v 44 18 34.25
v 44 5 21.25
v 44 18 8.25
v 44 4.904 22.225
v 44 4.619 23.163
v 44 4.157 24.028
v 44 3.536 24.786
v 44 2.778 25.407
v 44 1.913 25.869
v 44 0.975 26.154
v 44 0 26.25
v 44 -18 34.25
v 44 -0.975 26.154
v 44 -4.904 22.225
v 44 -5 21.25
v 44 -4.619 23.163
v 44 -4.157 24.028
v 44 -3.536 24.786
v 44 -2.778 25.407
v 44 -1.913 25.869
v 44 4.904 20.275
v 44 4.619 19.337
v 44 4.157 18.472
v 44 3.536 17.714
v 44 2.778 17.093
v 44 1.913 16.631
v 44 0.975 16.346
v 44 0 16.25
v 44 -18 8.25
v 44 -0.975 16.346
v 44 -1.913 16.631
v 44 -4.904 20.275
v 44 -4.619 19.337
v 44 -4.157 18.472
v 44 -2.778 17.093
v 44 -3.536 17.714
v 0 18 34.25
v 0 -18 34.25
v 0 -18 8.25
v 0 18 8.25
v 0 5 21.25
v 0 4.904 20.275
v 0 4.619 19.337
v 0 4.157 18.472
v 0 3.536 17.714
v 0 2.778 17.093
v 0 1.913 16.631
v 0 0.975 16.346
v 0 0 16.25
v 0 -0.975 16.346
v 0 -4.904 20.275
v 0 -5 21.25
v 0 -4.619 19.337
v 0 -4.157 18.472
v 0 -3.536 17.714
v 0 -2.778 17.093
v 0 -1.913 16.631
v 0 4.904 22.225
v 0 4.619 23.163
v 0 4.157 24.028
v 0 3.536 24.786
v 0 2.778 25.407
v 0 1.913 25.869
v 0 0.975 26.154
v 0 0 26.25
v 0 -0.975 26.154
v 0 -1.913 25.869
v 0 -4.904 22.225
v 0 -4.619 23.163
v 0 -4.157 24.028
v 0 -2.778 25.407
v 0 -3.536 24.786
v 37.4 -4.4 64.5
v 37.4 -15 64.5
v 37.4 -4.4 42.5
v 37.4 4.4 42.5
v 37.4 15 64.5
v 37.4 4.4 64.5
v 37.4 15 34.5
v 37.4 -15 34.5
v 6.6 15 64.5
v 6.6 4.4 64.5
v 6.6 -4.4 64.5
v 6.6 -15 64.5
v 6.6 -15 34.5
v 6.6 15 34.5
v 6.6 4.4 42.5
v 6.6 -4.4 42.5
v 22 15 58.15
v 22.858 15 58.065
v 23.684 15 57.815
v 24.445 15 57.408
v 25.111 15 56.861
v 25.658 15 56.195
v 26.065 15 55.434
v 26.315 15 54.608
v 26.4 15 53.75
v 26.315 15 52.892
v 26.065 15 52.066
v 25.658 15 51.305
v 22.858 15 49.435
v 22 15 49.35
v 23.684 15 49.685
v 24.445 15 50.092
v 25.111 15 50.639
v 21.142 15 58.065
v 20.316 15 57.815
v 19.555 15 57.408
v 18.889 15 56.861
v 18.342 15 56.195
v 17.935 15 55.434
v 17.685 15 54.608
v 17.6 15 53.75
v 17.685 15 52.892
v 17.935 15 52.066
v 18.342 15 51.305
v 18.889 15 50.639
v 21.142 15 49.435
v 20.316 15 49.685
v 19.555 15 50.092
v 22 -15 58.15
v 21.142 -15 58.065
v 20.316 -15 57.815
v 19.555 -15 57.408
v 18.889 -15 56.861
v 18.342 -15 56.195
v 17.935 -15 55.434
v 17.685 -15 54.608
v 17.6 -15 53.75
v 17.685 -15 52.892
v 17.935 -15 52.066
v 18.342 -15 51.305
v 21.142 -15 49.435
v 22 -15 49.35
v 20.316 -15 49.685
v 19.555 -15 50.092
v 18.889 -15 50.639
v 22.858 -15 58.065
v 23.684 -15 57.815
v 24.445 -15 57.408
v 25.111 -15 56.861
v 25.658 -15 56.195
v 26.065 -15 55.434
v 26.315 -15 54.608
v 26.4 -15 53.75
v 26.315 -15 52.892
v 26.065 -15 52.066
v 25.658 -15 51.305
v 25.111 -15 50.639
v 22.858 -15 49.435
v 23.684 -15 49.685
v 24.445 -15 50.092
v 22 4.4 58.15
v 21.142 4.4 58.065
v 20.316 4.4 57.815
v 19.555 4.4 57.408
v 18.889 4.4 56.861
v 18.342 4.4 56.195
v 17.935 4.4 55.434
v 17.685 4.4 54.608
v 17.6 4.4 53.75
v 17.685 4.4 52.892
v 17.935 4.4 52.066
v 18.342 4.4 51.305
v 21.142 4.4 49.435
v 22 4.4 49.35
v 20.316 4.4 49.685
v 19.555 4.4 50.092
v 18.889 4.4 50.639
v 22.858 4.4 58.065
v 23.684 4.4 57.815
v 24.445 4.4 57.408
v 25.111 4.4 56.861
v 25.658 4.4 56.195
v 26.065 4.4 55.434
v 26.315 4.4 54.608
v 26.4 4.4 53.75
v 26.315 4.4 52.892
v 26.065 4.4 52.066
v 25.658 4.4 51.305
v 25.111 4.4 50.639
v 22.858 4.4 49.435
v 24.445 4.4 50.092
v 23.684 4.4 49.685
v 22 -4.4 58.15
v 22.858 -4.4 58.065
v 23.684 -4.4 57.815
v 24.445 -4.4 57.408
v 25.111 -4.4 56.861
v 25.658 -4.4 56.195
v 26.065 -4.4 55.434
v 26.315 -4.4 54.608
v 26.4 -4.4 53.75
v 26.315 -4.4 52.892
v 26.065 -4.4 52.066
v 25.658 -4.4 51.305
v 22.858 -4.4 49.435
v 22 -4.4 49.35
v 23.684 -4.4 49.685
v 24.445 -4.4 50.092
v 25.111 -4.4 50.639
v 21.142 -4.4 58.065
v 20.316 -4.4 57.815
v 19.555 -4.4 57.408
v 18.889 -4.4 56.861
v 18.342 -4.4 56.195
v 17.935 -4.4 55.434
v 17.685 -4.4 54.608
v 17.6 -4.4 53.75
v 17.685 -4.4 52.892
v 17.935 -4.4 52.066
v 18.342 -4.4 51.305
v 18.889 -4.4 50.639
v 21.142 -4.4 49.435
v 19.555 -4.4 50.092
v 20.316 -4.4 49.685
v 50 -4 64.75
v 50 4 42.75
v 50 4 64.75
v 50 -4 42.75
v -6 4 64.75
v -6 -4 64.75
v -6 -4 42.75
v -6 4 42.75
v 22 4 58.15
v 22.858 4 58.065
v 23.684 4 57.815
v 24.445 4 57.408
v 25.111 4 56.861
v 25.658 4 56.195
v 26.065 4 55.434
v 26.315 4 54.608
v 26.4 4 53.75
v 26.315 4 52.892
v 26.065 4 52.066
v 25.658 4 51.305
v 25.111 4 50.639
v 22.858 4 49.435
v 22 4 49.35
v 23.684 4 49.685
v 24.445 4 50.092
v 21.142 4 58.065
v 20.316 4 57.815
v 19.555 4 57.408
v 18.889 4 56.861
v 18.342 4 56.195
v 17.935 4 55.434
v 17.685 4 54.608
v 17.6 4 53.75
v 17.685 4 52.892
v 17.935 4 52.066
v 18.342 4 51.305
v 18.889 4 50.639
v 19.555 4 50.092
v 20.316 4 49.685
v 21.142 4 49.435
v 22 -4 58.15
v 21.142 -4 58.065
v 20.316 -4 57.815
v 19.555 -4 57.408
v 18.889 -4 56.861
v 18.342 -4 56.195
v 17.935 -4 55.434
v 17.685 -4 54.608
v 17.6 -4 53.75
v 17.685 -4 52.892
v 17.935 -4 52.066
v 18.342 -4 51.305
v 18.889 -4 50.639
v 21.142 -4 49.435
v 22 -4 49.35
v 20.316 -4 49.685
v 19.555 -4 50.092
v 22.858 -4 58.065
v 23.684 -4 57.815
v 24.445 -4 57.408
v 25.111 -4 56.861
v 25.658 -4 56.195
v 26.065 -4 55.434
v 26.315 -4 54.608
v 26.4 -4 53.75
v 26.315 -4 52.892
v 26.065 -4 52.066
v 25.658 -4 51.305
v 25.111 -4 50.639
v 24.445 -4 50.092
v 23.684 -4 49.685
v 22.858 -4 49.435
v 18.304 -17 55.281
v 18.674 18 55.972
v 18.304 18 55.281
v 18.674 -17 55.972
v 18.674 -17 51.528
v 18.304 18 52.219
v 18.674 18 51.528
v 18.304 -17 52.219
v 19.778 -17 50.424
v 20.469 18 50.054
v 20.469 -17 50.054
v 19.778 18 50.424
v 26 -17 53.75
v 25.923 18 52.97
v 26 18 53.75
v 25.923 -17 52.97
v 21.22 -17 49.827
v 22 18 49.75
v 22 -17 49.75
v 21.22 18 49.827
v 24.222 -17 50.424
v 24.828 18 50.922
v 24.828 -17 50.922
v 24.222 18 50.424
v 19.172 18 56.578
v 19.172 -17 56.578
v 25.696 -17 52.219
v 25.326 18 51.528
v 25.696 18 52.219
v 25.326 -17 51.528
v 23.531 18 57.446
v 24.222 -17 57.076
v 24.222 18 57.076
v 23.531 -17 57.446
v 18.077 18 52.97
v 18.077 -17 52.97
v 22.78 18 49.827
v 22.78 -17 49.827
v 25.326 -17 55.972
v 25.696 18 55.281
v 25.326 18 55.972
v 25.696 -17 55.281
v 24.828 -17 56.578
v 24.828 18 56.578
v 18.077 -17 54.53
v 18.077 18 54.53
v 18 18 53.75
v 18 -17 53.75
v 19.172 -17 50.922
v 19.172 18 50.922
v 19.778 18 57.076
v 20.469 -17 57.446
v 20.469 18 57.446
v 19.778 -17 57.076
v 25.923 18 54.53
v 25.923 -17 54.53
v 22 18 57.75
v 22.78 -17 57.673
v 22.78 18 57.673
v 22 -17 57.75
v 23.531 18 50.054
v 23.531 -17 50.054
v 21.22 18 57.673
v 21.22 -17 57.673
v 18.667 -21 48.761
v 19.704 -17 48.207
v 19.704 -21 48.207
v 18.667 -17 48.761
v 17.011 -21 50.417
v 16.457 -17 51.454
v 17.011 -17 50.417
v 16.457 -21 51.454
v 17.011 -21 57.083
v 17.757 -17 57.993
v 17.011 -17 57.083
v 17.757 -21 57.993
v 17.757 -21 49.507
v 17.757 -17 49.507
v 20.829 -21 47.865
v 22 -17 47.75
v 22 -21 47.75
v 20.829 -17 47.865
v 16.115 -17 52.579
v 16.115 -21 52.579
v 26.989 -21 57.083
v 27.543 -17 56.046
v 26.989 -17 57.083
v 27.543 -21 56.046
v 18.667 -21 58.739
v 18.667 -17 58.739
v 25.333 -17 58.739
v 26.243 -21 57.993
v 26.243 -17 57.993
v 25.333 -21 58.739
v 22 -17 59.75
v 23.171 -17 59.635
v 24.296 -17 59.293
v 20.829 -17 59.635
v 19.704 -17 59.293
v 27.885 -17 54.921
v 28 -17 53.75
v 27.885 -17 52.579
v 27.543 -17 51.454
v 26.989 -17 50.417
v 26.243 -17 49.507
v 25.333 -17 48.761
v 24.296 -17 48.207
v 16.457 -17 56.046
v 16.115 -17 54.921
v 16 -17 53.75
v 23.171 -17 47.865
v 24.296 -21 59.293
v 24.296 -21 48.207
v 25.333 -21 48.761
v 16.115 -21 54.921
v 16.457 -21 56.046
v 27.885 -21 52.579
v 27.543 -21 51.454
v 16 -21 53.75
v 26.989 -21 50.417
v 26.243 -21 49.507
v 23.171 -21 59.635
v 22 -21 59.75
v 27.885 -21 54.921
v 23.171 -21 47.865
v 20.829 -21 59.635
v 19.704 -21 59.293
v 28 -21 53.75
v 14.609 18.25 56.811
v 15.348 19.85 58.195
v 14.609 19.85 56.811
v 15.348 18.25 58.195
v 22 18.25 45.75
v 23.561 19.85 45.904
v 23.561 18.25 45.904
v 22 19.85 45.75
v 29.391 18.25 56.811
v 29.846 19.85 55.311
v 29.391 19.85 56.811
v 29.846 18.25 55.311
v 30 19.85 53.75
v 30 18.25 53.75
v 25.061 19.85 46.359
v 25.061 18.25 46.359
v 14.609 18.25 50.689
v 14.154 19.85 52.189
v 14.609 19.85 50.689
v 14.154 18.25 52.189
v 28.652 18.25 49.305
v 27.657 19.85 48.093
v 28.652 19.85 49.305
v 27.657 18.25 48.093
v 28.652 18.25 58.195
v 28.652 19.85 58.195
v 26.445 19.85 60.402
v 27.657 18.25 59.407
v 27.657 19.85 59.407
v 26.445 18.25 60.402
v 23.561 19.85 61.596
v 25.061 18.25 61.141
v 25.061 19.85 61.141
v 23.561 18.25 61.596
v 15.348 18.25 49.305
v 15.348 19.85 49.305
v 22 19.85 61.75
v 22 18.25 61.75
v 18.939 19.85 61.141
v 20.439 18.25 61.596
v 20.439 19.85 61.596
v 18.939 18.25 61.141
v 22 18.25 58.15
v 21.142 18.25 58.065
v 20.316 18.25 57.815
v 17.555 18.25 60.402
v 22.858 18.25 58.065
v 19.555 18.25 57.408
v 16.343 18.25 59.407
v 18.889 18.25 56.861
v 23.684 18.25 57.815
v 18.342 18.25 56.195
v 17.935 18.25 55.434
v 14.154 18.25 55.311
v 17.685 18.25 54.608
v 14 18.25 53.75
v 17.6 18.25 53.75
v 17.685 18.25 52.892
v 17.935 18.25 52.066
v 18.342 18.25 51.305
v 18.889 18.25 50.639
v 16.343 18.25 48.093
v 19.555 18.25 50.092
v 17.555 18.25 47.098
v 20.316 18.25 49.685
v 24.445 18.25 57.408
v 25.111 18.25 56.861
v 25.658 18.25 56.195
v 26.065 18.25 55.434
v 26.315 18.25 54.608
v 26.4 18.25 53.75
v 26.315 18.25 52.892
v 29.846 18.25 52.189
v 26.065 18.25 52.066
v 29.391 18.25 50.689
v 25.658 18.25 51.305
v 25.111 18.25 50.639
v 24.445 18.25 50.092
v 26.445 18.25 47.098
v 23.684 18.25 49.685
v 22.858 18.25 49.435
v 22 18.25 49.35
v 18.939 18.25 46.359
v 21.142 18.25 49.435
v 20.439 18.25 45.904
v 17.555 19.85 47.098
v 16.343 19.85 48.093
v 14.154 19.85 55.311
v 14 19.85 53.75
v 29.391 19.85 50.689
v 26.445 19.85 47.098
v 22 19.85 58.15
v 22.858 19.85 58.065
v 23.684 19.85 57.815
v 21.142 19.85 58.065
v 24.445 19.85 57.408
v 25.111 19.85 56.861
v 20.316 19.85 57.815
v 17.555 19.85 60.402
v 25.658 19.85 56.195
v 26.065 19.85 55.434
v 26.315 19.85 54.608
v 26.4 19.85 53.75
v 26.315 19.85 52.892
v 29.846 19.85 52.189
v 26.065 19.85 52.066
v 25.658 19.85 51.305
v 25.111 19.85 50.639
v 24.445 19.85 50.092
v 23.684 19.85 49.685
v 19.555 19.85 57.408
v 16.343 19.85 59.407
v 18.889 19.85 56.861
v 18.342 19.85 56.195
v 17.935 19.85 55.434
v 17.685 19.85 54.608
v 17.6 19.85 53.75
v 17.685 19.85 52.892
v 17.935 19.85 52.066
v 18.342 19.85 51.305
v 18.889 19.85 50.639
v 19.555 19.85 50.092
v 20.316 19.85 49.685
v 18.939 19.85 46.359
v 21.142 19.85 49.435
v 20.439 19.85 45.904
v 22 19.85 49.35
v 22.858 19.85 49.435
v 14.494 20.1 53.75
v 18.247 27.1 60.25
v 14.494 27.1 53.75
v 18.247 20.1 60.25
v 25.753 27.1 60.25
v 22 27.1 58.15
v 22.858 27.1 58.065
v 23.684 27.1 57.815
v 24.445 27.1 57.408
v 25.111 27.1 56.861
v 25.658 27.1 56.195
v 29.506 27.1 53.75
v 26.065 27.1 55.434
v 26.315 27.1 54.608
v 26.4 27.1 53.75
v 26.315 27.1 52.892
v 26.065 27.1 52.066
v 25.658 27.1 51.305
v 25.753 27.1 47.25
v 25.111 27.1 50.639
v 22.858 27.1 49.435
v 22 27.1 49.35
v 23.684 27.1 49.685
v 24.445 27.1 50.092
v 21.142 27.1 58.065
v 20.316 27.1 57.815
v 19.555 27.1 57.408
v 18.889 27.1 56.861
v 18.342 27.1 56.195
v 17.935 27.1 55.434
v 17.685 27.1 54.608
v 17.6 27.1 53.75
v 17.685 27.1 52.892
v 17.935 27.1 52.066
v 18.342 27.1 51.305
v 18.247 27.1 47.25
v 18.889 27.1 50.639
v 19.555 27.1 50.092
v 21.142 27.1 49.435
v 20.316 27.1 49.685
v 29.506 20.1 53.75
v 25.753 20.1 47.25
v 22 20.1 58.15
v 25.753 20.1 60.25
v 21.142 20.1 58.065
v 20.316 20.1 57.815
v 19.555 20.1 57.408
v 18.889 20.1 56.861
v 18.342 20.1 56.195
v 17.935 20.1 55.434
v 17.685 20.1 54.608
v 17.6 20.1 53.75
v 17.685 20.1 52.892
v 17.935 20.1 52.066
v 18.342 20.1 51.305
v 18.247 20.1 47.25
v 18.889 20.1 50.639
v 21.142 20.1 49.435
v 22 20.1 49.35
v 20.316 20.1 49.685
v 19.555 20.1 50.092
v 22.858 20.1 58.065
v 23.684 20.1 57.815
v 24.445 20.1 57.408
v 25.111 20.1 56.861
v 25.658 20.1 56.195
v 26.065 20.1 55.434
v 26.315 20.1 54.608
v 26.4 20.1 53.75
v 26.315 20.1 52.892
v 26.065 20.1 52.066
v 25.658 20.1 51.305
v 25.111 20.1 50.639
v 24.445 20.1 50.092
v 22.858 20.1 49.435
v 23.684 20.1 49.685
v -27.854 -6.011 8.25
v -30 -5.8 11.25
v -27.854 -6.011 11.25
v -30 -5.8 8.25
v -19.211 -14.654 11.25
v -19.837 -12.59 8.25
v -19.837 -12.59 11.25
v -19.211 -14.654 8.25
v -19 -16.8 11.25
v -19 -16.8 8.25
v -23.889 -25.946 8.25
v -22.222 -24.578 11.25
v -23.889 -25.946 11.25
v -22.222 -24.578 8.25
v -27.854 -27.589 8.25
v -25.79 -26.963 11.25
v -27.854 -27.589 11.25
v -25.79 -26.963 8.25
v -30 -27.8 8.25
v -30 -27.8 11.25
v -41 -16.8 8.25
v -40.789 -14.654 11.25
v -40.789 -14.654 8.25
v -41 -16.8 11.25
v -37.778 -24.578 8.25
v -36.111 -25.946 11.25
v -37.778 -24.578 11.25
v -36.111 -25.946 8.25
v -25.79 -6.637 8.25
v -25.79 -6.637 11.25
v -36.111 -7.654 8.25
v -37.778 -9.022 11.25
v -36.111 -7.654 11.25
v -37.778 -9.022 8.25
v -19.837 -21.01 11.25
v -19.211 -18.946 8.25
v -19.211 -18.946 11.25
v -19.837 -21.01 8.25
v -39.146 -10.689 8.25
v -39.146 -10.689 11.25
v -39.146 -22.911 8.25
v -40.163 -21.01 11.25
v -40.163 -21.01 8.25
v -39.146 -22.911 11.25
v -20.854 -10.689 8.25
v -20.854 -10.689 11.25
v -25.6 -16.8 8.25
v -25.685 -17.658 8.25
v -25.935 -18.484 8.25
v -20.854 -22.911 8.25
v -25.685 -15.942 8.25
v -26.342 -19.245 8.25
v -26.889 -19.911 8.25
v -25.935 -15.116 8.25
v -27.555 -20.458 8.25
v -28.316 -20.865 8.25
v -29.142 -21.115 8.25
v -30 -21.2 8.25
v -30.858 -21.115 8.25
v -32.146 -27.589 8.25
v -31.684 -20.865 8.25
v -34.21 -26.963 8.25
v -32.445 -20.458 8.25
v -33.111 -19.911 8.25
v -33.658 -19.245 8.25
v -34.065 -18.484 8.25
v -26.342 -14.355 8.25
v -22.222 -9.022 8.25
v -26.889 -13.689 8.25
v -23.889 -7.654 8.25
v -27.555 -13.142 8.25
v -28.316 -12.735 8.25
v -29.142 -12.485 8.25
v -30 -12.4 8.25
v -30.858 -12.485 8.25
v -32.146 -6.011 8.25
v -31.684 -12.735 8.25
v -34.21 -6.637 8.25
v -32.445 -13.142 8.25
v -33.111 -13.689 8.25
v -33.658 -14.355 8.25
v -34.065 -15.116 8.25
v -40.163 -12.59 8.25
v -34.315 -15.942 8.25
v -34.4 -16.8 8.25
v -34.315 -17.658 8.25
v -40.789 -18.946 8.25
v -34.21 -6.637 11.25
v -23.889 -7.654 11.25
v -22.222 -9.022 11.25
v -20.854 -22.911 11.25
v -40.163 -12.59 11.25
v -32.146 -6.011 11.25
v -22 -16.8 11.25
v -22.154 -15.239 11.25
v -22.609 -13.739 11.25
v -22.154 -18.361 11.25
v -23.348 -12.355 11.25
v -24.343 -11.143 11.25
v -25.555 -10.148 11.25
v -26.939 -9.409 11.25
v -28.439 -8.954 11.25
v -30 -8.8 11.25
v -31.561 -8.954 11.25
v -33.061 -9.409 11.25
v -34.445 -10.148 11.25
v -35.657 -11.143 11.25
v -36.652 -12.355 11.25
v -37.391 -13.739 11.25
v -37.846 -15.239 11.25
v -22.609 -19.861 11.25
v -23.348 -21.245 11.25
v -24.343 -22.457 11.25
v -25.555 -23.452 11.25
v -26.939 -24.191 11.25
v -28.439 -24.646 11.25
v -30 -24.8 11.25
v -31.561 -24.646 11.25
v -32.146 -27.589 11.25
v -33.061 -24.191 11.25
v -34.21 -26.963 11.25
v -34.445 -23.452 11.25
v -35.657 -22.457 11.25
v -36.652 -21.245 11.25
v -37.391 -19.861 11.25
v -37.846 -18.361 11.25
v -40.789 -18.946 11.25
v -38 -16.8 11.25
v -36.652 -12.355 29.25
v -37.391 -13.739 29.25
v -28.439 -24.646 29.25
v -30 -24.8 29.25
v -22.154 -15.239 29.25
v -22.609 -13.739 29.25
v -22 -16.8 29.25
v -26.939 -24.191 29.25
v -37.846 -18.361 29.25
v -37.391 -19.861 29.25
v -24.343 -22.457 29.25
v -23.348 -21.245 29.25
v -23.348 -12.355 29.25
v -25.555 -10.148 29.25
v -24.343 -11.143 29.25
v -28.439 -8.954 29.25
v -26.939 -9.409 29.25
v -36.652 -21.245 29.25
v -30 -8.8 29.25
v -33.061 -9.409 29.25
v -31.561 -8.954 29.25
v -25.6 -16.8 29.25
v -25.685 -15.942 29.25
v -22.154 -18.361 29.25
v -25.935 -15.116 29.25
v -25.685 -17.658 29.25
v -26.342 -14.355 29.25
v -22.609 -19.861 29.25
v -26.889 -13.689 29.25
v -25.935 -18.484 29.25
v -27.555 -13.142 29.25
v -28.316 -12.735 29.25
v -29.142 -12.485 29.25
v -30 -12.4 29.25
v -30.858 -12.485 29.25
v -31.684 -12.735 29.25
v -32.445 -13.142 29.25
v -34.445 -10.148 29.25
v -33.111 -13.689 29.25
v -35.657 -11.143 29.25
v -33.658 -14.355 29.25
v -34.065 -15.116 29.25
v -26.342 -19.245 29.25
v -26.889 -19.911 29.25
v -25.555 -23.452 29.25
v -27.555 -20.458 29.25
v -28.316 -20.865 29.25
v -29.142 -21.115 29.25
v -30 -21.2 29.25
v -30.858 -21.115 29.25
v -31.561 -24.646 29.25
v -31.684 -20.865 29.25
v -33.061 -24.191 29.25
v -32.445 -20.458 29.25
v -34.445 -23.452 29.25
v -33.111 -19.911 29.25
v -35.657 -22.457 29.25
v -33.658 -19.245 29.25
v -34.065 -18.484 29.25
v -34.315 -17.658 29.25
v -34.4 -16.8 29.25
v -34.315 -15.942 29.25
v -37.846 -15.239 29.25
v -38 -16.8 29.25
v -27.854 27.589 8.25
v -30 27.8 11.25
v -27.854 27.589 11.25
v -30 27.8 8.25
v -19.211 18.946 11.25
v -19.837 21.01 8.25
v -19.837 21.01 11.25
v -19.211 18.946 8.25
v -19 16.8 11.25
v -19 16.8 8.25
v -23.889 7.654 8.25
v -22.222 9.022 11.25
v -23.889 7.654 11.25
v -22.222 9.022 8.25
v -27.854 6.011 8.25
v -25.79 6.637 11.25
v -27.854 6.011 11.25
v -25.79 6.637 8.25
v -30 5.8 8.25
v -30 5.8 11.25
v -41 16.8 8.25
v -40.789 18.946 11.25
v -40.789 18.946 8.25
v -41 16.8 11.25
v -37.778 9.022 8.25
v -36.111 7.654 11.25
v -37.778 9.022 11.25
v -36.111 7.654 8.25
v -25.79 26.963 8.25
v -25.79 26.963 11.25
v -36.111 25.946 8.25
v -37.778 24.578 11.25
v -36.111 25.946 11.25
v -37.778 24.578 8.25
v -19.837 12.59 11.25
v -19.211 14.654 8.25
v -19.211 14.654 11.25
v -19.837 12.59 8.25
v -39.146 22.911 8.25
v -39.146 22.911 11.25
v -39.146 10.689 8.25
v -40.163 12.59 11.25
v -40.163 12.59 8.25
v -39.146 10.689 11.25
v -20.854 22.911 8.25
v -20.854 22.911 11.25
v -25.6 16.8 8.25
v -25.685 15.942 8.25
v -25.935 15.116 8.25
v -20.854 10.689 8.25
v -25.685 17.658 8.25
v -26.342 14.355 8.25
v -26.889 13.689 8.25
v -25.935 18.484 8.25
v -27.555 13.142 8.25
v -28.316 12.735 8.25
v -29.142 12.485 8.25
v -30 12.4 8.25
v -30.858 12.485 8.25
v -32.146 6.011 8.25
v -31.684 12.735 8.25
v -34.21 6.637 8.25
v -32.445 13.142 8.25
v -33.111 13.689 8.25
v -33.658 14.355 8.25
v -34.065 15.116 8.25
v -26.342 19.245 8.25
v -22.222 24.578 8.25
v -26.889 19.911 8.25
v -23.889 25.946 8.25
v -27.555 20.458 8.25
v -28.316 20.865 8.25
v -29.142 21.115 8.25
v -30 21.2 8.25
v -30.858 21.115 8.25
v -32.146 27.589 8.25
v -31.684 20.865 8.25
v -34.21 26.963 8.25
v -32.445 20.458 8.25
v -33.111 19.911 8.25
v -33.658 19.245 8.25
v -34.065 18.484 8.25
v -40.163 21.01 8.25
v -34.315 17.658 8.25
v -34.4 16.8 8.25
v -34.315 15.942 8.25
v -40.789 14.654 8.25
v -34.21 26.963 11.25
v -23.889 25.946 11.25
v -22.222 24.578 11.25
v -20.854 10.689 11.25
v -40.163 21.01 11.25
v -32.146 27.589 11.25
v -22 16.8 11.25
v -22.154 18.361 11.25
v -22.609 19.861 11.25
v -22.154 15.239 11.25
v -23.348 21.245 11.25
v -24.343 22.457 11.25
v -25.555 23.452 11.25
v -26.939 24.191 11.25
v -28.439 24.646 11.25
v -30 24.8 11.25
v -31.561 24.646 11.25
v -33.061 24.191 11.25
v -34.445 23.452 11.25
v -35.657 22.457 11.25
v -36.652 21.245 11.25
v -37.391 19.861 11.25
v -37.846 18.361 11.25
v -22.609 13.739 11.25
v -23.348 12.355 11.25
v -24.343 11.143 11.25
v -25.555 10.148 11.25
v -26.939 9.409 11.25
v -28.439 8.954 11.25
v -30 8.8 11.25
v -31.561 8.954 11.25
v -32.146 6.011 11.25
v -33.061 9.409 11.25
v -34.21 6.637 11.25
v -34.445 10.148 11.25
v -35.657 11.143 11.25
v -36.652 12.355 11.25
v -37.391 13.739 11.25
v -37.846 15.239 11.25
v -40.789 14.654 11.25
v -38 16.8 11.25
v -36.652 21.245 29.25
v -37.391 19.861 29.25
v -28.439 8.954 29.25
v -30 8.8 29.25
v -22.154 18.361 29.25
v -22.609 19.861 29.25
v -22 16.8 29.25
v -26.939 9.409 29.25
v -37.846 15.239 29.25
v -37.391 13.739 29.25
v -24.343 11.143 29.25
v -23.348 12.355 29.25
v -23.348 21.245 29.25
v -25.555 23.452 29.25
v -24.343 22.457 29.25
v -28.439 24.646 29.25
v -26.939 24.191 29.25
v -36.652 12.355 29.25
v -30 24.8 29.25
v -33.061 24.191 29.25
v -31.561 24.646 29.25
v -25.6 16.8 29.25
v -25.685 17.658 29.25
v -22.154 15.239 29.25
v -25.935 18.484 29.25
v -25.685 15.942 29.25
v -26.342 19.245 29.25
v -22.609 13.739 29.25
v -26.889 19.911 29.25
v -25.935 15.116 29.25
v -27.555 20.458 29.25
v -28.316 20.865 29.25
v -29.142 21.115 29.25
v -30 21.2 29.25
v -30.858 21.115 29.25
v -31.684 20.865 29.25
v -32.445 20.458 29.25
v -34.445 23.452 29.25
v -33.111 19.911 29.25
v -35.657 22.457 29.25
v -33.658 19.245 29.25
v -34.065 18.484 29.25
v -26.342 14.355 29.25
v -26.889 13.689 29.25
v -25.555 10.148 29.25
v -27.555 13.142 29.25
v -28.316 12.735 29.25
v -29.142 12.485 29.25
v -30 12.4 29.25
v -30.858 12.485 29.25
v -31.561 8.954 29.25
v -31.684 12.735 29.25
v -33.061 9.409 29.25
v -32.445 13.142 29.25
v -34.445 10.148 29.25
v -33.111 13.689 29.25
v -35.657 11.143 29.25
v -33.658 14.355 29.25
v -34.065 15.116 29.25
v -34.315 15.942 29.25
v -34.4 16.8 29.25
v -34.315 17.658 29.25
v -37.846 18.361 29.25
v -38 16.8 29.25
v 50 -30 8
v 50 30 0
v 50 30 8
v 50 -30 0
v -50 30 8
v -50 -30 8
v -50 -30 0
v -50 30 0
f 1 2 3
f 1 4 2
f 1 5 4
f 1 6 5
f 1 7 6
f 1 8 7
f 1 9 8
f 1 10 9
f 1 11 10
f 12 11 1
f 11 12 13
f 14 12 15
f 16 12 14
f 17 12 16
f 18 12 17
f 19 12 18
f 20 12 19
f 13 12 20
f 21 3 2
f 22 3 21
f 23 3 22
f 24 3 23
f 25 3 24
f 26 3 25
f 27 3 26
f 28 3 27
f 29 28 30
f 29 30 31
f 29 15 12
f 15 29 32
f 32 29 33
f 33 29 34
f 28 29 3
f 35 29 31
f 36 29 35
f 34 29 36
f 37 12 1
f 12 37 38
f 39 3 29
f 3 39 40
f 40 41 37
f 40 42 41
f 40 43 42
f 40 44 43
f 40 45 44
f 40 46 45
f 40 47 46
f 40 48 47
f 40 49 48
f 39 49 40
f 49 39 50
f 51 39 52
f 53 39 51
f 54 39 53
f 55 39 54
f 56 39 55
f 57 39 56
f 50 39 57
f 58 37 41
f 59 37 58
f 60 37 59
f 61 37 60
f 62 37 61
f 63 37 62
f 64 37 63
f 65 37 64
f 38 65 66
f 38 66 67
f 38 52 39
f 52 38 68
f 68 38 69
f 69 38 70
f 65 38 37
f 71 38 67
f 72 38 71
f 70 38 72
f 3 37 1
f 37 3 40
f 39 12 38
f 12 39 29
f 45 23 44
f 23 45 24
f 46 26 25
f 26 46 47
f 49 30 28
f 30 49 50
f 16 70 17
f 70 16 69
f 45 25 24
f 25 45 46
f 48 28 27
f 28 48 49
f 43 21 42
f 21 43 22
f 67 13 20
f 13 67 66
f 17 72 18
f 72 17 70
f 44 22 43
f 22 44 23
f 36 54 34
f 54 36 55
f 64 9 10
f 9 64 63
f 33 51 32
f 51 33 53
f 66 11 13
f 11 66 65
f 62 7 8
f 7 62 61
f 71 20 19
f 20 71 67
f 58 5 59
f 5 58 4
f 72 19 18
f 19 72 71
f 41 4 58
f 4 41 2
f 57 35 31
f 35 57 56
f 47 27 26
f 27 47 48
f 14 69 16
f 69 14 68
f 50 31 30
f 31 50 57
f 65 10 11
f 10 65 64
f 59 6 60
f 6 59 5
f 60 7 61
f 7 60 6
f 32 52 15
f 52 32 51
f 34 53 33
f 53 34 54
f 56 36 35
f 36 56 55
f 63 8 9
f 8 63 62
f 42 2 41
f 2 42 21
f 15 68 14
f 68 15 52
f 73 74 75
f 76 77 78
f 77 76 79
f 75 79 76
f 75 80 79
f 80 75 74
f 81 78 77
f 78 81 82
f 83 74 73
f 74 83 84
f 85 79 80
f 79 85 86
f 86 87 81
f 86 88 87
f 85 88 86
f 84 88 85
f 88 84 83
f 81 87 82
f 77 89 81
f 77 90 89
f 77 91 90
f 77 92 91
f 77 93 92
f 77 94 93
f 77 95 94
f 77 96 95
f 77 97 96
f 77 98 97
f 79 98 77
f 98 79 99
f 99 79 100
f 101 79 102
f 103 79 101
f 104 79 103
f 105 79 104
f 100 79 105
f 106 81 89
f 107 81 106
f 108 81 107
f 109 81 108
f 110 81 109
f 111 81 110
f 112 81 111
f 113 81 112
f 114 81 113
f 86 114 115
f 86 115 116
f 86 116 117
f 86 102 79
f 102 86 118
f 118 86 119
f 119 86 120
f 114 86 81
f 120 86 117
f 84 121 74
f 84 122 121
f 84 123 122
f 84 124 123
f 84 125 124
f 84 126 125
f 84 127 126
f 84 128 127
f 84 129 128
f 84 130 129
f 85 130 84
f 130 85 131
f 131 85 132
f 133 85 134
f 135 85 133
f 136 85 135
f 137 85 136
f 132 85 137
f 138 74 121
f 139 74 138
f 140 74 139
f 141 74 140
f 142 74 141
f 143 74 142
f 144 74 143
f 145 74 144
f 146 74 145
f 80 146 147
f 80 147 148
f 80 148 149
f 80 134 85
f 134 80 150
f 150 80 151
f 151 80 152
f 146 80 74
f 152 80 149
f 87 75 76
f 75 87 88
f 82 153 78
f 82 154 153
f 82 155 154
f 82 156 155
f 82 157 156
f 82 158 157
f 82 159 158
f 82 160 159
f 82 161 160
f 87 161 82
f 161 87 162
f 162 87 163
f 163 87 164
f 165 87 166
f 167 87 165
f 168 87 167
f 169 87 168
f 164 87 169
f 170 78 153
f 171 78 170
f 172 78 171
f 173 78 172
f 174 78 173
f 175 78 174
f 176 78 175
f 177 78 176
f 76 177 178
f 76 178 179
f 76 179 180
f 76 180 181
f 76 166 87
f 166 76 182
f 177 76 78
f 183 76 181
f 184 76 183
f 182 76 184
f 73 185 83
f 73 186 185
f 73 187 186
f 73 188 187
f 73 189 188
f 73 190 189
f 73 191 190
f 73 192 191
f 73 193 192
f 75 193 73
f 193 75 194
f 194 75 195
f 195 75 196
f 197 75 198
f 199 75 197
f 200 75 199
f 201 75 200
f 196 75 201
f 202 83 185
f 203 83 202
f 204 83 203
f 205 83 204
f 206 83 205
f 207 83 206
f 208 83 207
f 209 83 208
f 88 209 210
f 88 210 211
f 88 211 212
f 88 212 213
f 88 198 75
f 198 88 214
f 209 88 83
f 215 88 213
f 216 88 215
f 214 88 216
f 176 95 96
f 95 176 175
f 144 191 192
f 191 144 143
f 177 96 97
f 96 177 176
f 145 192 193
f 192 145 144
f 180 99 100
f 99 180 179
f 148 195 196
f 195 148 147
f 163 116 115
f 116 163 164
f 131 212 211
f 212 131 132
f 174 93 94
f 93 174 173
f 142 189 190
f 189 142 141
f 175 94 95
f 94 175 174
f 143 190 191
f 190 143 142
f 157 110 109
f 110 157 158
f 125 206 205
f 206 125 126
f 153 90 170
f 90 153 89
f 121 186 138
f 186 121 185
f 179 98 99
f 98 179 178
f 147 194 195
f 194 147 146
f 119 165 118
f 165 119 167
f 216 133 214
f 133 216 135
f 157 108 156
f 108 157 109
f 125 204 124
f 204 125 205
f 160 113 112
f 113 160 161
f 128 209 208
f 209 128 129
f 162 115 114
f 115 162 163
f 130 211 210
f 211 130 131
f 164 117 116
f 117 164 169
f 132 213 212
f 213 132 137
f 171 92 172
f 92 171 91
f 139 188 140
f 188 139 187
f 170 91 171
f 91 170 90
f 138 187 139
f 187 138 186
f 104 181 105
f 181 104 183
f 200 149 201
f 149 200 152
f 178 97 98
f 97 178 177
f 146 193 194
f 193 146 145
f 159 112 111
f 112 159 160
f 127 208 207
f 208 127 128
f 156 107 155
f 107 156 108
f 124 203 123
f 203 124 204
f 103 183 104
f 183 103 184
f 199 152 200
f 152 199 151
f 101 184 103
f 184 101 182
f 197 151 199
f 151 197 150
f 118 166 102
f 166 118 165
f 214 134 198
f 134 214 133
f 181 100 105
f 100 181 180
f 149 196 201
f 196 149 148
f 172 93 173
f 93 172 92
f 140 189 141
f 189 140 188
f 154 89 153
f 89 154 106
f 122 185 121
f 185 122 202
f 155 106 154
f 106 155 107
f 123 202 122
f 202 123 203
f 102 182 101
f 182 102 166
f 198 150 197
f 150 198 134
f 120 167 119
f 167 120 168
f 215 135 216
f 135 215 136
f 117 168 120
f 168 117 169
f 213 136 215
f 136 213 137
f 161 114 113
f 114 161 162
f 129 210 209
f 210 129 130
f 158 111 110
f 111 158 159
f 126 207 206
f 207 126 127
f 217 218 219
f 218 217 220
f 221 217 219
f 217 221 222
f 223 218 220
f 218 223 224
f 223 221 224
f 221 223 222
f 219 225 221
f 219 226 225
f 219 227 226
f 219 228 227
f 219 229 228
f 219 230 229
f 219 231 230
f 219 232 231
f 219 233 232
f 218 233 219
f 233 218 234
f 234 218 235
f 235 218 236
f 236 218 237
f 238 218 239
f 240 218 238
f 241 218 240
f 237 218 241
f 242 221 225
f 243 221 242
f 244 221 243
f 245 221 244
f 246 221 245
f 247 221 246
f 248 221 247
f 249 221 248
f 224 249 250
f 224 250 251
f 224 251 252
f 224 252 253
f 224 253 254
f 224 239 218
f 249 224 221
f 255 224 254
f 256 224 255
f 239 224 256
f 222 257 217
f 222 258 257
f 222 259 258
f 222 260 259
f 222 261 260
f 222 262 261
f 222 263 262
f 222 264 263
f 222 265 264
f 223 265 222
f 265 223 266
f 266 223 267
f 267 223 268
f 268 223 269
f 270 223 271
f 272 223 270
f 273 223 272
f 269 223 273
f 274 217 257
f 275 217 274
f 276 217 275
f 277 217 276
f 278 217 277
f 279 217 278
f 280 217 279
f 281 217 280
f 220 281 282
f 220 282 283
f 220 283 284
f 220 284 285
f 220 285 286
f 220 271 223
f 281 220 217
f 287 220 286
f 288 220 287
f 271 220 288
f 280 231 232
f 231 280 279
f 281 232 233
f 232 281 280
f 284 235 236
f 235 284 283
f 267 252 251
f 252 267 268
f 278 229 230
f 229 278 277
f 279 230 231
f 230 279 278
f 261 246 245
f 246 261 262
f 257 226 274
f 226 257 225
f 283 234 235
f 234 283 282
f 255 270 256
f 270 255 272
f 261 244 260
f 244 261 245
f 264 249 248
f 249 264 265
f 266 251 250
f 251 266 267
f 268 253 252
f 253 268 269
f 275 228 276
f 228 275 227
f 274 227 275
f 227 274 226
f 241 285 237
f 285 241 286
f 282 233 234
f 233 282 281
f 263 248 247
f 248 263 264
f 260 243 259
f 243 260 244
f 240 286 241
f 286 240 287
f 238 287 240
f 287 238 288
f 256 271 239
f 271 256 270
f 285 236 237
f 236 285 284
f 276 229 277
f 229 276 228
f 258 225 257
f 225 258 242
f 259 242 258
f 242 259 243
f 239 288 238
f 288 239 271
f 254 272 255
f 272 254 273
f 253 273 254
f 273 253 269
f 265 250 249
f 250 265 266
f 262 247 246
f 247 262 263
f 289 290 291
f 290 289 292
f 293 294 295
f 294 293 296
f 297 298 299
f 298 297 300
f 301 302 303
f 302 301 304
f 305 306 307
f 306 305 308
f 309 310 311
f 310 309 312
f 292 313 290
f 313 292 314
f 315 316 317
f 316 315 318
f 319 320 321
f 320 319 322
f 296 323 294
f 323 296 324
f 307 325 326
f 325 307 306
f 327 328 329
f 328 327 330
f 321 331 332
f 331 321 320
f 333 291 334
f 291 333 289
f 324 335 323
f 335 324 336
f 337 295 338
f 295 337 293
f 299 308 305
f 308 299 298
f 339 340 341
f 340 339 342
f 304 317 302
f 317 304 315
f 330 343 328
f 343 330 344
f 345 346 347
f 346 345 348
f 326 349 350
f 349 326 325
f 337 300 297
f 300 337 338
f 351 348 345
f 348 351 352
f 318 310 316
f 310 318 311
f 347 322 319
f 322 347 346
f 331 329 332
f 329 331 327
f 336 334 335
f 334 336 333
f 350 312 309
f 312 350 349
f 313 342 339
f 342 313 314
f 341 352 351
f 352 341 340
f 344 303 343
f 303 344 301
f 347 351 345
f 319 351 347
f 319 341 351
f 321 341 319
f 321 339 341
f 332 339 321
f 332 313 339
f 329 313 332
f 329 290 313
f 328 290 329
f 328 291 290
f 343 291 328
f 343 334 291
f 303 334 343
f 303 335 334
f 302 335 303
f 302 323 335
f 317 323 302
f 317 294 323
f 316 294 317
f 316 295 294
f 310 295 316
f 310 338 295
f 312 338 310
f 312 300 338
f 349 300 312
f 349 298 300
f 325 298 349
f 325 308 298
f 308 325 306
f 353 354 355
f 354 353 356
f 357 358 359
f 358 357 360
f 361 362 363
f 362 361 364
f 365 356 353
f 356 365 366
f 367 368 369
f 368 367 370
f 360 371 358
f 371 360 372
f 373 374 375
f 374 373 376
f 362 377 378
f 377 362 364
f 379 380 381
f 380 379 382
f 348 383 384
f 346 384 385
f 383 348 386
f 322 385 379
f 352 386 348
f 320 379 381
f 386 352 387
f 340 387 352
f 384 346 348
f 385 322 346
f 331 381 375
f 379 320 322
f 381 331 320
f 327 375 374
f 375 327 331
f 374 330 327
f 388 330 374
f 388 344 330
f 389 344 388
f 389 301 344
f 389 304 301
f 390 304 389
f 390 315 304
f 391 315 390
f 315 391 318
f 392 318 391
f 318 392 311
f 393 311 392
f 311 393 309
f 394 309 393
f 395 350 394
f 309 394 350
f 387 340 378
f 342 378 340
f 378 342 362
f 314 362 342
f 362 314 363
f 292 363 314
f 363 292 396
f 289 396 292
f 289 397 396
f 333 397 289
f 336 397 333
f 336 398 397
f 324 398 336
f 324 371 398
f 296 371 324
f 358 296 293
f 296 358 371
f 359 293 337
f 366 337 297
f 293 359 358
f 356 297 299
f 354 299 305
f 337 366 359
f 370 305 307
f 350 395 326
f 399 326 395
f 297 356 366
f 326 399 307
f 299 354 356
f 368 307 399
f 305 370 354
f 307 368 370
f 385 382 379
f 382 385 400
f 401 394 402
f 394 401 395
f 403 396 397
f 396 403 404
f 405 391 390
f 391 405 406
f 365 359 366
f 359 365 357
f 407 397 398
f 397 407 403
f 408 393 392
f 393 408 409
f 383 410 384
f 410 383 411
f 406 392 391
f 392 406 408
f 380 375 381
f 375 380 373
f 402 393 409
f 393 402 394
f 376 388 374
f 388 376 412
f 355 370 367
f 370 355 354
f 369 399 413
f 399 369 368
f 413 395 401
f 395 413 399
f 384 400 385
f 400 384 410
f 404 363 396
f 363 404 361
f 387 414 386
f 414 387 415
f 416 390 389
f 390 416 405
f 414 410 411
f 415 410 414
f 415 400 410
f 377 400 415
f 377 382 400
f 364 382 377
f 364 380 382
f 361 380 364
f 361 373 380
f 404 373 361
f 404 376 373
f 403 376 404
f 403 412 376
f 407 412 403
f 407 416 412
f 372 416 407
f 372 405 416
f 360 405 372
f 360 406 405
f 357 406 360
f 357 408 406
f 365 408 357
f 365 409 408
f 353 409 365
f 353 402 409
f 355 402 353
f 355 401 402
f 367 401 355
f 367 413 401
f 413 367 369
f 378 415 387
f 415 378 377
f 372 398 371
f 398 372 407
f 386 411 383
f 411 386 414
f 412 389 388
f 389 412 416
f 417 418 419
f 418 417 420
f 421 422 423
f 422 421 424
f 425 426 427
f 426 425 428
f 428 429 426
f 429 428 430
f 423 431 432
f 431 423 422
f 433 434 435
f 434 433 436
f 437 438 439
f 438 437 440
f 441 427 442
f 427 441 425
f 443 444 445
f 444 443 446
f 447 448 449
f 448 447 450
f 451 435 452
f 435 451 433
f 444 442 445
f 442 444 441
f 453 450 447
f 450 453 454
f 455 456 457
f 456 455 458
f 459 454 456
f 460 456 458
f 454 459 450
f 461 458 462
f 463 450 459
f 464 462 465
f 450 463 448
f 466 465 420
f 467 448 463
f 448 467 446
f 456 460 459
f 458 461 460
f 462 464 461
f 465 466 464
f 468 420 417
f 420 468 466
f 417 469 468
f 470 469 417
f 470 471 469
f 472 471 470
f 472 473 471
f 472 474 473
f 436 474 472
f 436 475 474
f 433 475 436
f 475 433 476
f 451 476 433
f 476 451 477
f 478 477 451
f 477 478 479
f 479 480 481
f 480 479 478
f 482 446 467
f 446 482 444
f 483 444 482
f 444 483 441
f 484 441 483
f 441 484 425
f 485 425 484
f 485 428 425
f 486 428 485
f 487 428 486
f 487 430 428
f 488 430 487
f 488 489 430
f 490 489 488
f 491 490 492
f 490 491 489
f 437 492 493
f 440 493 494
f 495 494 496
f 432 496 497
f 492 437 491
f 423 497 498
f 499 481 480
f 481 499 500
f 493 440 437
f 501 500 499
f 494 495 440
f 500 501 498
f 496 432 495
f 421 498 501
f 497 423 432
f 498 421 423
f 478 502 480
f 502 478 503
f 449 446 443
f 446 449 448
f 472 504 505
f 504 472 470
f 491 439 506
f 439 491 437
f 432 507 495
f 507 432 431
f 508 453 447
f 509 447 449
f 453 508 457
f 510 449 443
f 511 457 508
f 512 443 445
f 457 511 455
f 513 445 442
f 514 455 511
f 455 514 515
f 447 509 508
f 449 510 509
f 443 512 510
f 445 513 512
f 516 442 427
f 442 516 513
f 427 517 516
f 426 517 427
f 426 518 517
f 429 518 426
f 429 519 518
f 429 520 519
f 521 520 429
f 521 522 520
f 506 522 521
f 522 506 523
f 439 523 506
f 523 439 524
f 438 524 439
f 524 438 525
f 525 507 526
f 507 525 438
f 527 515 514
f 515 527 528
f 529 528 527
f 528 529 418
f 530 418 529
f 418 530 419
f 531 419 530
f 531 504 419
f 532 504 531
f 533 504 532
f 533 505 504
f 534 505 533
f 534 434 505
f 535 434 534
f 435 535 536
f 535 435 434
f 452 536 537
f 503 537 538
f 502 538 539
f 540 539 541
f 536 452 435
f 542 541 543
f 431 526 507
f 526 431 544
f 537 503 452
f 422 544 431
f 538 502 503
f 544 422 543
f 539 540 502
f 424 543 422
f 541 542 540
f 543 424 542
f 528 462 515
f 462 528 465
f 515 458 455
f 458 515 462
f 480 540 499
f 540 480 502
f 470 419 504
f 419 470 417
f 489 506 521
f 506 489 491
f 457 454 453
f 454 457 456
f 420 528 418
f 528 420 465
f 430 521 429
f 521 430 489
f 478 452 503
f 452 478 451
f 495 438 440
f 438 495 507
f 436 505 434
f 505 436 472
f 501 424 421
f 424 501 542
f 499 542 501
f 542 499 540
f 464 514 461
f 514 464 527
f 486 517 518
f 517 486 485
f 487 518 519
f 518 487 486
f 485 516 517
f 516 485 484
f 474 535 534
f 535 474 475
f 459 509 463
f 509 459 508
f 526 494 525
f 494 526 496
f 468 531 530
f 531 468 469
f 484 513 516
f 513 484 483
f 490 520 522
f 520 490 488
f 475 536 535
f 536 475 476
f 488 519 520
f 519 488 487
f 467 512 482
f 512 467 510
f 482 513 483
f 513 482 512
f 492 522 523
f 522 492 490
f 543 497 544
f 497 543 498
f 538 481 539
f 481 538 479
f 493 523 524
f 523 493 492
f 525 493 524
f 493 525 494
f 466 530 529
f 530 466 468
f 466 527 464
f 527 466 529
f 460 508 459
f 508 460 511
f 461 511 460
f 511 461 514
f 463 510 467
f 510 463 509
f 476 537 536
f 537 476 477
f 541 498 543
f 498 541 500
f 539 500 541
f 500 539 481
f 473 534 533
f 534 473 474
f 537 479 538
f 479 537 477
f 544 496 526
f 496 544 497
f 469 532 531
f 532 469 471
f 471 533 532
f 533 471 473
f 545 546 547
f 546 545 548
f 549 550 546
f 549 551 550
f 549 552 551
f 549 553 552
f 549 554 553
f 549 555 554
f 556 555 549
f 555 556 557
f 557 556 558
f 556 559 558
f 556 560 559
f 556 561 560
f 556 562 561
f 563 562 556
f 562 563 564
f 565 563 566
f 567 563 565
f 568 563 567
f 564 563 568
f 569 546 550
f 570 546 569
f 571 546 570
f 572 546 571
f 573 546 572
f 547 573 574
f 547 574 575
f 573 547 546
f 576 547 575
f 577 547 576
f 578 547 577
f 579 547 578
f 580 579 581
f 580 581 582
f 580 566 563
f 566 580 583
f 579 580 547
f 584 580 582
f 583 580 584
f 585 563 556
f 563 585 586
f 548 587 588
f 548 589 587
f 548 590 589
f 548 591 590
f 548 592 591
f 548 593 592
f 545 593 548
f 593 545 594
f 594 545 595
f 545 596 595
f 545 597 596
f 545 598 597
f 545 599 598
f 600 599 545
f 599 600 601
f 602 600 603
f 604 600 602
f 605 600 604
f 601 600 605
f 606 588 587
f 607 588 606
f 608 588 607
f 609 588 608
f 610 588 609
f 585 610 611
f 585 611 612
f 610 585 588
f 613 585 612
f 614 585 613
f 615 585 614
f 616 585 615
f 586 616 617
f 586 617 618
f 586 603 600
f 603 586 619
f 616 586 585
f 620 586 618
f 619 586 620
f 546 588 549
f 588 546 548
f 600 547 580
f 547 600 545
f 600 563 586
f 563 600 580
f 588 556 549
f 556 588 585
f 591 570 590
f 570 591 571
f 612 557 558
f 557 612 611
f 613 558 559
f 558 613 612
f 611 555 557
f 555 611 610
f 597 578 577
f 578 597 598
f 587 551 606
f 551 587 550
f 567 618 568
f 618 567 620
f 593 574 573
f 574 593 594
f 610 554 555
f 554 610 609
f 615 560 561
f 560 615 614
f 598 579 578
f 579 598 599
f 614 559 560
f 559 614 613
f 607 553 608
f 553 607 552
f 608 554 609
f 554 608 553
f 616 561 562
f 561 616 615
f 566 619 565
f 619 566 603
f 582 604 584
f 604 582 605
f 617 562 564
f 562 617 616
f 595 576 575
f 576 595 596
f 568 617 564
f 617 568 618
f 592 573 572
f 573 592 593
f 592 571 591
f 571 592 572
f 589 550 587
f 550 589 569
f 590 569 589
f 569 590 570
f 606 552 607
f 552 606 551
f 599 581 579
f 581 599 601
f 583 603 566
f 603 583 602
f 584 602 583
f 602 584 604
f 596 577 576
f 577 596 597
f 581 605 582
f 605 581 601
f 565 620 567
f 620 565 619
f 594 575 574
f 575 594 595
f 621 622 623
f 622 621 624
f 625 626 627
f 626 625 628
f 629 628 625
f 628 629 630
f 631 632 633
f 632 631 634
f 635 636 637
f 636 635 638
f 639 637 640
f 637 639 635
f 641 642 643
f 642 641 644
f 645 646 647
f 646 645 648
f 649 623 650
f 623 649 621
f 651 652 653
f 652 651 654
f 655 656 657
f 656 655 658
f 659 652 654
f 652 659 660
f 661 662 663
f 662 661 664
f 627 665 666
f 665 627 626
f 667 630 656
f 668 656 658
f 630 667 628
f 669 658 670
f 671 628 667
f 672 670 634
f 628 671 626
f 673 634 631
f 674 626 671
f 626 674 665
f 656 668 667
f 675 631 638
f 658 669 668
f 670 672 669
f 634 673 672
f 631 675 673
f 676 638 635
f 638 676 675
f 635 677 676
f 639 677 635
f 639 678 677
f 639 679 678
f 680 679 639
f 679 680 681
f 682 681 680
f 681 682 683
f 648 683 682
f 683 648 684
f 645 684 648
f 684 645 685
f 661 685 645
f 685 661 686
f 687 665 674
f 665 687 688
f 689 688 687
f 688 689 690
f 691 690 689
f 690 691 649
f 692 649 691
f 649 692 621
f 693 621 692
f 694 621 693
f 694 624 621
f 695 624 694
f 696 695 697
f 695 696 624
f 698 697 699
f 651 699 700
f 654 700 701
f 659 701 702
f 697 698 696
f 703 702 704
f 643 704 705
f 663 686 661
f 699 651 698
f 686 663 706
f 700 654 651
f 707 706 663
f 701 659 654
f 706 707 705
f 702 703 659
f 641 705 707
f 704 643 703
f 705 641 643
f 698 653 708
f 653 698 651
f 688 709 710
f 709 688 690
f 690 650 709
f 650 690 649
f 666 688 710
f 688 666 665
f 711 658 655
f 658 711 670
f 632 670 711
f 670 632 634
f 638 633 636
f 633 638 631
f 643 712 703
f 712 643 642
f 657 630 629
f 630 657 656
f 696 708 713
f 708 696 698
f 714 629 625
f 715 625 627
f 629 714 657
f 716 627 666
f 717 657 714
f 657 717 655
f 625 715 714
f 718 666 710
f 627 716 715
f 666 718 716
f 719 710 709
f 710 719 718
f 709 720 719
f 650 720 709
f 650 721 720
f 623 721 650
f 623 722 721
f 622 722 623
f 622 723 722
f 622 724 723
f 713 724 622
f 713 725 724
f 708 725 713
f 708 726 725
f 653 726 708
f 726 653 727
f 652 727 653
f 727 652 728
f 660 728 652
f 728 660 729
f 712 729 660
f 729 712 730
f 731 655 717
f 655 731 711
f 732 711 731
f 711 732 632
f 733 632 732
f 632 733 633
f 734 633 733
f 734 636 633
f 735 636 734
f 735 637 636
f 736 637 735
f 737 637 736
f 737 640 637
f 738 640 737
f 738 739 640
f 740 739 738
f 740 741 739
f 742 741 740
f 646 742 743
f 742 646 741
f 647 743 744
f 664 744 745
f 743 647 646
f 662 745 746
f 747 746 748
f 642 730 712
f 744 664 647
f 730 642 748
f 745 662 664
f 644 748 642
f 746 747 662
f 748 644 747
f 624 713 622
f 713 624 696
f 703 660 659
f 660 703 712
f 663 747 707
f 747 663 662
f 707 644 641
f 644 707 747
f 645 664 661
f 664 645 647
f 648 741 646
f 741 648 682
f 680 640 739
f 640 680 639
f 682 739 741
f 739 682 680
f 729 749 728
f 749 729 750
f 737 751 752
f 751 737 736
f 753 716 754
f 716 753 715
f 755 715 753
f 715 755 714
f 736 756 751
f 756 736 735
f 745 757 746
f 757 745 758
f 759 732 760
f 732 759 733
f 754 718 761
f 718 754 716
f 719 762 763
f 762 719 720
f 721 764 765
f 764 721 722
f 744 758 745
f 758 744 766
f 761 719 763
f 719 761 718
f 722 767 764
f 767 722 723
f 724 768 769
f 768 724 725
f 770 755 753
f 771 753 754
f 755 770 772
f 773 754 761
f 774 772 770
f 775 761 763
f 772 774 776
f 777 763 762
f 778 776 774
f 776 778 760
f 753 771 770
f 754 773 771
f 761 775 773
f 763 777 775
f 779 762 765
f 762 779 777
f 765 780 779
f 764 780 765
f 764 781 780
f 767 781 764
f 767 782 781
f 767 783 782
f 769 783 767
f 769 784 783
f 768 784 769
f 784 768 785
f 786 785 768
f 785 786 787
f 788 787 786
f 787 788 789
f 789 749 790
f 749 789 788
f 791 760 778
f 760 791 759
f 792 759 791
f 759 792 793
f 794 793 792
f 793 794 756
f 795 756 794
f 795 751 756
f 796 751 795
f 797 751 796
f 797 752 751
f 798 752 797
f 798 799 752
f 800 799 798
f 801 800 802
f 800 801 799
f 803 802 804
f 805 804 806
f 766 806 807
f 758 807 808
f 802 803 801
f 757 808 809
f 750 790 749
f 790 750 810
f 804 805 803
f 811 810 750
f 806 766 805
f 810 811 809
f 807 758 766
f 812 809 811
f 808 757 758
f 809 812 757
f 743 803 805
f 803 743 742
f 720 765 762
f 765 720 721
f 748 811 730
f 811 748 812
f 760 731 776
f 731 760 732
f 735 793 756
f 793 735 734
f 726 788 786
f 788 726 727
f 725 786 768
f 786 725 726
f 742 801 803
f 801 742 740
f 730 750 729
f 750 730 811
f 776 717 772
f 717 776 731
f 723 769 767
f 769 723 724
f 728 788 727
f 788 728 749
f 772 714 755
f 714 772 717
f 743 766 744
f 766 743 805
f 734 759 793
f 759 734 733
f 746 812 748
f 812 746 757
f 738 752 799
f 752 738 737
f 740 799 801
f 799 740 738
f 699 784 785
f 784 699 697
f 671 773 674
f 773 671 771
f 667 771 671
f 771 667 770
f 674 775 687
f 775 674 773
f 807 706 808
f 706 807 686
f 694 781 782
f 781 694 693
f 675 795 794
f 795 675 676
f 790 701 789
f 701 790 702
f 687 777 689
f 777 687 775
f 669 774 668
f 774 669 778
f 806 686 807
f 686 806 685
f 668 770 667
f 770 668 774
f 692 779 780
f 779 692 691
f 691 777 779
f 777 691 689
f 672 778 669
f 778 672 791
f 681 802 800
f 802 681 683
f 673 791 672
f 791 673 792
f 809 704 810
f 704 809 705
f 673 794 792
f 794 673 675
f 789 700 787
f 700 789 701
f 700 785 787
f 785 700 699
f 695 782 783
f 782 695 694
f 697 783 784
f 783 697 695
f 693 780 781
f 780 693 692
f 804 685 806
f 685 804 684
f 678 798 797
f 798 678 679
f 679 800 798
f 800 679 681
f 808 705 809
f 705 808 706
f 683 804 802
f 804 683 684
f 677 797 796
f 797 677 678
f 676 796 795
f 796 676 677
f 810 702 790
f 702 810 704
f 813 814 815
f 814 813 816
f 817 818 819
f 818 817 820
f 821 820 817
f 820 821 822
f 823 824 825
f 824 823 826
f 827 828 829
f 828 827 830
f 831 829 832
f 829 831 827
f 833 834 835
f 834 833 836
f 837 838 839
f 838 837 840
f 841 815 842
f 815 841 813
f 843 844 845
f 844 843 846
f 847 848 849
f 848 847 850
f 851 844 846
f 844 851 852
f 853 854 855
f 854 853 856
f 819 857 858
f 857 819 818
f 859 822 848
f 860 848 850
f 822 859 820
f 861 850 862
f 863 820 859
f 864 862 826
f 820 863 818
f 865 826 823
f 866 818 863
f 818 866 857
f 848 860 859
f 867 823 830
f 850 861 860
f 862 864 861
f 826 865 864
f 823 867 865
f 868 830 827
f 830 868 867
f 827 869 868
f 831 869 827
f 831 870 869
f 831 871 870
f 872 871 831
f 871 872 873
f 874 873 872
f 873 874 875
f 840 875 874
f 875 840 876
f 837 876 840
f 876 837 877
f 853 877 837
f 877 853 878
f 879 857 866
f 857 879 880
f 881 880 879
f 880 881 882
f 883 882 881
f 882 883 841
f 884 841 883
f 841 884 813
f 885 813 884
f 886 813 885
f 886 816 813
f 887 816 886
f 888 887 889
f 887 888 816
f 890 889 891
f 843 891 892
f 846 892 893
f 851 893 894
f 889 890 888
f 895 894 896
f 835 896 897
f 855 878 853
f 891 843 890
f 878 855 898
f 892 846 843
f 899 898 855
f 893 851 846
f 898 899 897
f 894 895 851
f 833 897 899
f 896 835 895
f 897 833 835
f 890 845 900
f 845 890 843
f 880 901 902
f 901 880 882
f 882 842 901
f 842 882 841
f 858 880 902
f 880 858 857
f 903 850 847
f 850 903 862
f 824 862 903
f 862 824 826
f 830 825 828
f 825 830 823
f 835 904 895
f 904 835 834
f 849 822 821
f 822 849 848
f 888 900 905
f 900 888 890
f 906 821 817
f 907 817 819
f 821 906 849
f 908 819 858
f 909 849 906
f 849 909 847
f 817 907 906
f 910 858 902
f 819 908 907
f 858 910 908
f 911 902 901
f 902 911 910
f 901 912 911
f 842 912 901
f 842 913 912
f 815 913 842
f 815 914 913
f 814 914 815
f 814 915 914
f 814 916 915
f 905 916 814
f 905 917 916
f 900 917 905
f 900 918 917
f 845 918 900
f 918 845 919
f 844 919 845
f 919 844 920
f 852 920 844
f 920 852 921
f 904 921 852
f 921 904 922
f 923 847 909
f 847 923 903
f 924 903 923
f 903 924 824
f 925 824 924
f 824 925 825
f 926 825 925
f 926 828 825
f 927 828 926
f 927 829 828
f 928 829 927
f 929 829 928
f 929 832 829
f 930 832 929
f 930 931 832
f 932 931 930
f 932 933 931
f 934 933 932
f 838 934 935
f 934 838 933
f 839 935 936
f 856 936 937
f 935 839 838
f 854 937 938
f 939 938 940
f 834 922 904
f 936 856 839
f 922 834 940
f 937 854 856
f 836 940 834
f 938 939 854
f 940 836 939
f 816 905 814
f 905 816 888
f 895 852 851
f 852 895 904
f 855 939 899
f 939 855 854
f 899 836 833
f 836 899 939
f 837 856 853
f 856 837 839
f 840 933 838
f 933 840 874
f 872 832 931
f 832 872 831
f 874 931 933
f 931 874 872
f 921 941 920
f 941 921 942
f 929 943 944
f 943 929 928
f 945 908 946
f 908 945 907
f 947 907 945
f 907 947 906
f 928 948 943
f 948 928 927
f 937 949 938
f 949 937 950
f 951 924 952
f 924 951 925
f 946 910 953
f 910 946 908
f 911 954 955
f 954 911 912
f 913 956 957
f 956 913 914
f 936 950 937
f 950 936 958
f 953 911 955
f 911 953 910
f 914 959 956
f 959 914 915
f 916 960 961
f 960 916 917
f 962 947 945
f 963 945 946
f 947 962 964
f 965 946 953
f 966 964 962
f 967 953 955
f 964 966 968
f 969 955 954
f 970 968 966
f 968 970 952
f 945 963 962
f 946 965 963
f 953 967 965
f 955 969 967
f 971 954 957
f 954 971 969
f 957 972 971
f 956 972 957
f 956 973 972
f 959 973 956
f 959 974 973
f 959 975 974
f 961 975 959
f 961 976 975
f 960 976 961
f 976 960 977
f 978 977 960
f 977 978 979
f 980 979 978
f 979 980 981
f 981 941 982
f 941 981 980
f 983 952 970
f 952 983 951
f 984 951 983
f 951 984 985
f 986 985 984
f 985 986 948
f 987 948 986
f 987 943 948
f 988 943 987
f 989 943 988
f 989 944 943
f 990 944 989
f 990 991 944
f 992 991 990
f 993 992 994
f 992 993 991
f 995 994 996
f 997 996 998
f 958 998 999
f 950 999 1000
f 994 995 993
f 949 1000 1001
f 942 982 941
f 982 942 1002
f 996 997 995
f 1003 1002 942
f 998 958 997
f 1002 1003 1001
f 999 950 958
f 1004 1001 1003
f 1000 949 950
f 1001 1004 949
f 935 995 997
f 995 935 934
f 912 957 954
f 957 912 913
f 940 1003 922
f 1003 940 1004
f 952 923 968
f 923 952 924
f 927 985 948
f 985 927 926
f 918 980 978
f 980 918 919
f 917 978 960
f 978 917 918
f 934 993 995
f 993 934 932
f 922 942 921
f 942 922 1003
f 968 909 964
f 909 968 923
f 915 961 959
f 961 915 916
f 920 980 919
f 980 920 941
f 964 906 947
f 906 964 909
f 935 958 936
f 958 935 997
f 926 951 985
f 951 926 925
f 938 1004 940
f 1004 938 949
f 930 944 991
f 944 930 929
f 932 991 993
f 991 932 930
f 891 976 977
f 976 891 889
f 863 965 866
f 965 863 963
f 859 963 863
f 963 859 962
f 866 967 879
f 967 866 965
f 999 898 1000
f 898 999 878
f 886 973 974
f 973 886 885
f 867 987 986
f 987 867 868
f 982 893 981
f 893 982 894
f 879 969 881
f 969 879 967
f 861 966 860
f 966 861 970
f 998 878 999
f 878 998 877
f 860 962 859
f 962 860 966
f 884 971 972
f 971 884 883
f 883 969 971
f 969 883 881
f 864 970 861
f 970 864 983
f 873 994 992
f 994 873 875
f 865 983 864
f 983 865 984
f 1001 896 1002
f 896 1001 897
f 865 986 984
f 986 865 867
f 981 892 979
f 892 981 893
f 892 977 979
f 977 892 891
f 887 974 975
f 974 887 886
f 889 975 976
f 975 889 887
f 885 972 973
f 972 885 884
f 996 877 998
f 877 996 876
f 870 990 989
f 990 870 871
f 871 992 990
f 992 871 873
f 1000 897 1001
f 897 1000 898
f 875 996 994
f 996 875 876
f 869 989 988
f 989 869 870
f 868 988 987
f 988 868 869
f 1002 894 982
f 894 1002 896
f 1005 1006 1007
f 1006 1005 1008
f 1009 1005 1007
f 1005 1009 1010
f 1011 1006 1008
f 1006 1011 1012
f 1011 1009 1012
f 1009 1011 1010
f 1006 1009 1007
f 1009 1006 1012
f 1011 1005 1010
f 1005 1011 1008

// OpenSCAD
$fn = 32;

// ------------------------------------------------------------------------
// Indexing jig: plate 100 x 60 mm, pin d8
// Every part is its own module, assembly() places every instance.
// ------------------------------------------------------------------------

// --- part 1 ---
module jig_plate() {
  difference() {
    translate([-50, -30, 0]) cube([100, 60, 8]);
  }
}

// --- part 2 ---
module locator_block() {
  difference() {
    translate([-22, -18, 0]) cube([44, 36, 26]);
    translate([0, 0, 13]) rotate([0, 90, 0]) cylinder(h = 46, d = 10, center = true);
  }
}

// --- part 3 ---
module index_fork() {
  difference() {
    translate([-15.4, -15, 0]) cube([30.8, 30, 30]);
    translate([-16.4, -4.4, 8]) cube([32.8, 8.8, 23]);
    translate([0, 0, 19.25]) rotate([90, 0, 0]) cylinder(h = 32, d = 8.8, center = true);
  }
}

// --- part 4 ---
module index_arm() {
  difference() {
    translate([-28, -4, 0]) cube([56, 8, 22]);
    translate([0, 0, 11]) rotate([90, 0, 0]) cylinder(h = 10, d = 8.8, center = true);
  }
}

// --- part 5 ---
module index_pin() {
  rotate([0, 90, 0]) cylinder(h = 36, d = 8, center = true);
  translate([-21, 0, 0]) rotate([0, 90, 0]) cylinder(h = 4, d = 12);
}

// --- part 6 ---
module pin_washer() {
  difference() {
      translate([0, 0, 0]) cylinder(h = 1.6, d = 16);
      translate([0, 0, -1]) cylinder(h = 3.6, d = 8.8);
    }
}

// --- part 7 ---
module lock_nut() {
  difference() {
    linear_extrude(height = 7) polygon(points = [[7.506, 0], [3.753, 6.5], [-3.753, 6.5], [-7.506, 0], [-3.753, -6.5], [3.753, -6.5]]);
    translate([0, 0, -1]) cylinder(h = 9, d = 8.8);
  }
}

// --- part 8 ---
module guide_bush_a() {
  difference() {
    union() {
      cylinder(h = 3, d = 22);
      translate([0, 0, 3]) cylinder(h = 18, d = 16);
    }
    translate([0, 0, -1]) cylinder(h = 23, d = 8.8);
  }
}

// --- part 9 ---
module guide_bush_b() {
  difference() {
    union() {
      cylinder(h = 3, d = 22);
      translate([0, 0, 3]) cylinder(h = 18, d = 16);
    }
    translate([0, 0, -1]) cylinder(h = 23, d = 8.8);
  }
}

// --- assembly ---
module assembly() {
  color([0.80, 0.24, 0.20]) translate([0, 0, 0]) rotate([0, 0, 0]) jig_plate();
  color([0.20, 0.45, 0.75]) translate([22, 0, 8.25]) rotate([0, 0, 0]) locator_block();
  color([0.25, 0.62, 0.32]) translate([22, 0, 34.5]) rotate([0, 0, 0]) index_fork();
  color([0.92, 0.70, 0.18]) translate([22, 0, 42.75]) rotate([0, 0, 0]) index_arm();
  color([0.58, 0.35, 0.70]) translate([22, 0, 53.75]) rotate([0, 0, 90]) index_pin();
  color([0.16, 0.66, 0.66]) translate([22, 19.85, 53.75]) rotate([90, 0, 0]) pin_washer();
  color([0.85, 0.48, 0.18]) translate([22, 27.1, 53.75]) rotate([90, 0, 0]) lock_nut();
  color([0.55, 0.60, 0.65]) translate([-30, -16.8, 8.25]) rotate([0, 0, 0]) guide_bush_a();
  color([0.75, 0.30, 0.55]) translate([-30, 16.8, 8.25]) rotate([0, 0, 0]) guide_bush_b();
}

assembly();
